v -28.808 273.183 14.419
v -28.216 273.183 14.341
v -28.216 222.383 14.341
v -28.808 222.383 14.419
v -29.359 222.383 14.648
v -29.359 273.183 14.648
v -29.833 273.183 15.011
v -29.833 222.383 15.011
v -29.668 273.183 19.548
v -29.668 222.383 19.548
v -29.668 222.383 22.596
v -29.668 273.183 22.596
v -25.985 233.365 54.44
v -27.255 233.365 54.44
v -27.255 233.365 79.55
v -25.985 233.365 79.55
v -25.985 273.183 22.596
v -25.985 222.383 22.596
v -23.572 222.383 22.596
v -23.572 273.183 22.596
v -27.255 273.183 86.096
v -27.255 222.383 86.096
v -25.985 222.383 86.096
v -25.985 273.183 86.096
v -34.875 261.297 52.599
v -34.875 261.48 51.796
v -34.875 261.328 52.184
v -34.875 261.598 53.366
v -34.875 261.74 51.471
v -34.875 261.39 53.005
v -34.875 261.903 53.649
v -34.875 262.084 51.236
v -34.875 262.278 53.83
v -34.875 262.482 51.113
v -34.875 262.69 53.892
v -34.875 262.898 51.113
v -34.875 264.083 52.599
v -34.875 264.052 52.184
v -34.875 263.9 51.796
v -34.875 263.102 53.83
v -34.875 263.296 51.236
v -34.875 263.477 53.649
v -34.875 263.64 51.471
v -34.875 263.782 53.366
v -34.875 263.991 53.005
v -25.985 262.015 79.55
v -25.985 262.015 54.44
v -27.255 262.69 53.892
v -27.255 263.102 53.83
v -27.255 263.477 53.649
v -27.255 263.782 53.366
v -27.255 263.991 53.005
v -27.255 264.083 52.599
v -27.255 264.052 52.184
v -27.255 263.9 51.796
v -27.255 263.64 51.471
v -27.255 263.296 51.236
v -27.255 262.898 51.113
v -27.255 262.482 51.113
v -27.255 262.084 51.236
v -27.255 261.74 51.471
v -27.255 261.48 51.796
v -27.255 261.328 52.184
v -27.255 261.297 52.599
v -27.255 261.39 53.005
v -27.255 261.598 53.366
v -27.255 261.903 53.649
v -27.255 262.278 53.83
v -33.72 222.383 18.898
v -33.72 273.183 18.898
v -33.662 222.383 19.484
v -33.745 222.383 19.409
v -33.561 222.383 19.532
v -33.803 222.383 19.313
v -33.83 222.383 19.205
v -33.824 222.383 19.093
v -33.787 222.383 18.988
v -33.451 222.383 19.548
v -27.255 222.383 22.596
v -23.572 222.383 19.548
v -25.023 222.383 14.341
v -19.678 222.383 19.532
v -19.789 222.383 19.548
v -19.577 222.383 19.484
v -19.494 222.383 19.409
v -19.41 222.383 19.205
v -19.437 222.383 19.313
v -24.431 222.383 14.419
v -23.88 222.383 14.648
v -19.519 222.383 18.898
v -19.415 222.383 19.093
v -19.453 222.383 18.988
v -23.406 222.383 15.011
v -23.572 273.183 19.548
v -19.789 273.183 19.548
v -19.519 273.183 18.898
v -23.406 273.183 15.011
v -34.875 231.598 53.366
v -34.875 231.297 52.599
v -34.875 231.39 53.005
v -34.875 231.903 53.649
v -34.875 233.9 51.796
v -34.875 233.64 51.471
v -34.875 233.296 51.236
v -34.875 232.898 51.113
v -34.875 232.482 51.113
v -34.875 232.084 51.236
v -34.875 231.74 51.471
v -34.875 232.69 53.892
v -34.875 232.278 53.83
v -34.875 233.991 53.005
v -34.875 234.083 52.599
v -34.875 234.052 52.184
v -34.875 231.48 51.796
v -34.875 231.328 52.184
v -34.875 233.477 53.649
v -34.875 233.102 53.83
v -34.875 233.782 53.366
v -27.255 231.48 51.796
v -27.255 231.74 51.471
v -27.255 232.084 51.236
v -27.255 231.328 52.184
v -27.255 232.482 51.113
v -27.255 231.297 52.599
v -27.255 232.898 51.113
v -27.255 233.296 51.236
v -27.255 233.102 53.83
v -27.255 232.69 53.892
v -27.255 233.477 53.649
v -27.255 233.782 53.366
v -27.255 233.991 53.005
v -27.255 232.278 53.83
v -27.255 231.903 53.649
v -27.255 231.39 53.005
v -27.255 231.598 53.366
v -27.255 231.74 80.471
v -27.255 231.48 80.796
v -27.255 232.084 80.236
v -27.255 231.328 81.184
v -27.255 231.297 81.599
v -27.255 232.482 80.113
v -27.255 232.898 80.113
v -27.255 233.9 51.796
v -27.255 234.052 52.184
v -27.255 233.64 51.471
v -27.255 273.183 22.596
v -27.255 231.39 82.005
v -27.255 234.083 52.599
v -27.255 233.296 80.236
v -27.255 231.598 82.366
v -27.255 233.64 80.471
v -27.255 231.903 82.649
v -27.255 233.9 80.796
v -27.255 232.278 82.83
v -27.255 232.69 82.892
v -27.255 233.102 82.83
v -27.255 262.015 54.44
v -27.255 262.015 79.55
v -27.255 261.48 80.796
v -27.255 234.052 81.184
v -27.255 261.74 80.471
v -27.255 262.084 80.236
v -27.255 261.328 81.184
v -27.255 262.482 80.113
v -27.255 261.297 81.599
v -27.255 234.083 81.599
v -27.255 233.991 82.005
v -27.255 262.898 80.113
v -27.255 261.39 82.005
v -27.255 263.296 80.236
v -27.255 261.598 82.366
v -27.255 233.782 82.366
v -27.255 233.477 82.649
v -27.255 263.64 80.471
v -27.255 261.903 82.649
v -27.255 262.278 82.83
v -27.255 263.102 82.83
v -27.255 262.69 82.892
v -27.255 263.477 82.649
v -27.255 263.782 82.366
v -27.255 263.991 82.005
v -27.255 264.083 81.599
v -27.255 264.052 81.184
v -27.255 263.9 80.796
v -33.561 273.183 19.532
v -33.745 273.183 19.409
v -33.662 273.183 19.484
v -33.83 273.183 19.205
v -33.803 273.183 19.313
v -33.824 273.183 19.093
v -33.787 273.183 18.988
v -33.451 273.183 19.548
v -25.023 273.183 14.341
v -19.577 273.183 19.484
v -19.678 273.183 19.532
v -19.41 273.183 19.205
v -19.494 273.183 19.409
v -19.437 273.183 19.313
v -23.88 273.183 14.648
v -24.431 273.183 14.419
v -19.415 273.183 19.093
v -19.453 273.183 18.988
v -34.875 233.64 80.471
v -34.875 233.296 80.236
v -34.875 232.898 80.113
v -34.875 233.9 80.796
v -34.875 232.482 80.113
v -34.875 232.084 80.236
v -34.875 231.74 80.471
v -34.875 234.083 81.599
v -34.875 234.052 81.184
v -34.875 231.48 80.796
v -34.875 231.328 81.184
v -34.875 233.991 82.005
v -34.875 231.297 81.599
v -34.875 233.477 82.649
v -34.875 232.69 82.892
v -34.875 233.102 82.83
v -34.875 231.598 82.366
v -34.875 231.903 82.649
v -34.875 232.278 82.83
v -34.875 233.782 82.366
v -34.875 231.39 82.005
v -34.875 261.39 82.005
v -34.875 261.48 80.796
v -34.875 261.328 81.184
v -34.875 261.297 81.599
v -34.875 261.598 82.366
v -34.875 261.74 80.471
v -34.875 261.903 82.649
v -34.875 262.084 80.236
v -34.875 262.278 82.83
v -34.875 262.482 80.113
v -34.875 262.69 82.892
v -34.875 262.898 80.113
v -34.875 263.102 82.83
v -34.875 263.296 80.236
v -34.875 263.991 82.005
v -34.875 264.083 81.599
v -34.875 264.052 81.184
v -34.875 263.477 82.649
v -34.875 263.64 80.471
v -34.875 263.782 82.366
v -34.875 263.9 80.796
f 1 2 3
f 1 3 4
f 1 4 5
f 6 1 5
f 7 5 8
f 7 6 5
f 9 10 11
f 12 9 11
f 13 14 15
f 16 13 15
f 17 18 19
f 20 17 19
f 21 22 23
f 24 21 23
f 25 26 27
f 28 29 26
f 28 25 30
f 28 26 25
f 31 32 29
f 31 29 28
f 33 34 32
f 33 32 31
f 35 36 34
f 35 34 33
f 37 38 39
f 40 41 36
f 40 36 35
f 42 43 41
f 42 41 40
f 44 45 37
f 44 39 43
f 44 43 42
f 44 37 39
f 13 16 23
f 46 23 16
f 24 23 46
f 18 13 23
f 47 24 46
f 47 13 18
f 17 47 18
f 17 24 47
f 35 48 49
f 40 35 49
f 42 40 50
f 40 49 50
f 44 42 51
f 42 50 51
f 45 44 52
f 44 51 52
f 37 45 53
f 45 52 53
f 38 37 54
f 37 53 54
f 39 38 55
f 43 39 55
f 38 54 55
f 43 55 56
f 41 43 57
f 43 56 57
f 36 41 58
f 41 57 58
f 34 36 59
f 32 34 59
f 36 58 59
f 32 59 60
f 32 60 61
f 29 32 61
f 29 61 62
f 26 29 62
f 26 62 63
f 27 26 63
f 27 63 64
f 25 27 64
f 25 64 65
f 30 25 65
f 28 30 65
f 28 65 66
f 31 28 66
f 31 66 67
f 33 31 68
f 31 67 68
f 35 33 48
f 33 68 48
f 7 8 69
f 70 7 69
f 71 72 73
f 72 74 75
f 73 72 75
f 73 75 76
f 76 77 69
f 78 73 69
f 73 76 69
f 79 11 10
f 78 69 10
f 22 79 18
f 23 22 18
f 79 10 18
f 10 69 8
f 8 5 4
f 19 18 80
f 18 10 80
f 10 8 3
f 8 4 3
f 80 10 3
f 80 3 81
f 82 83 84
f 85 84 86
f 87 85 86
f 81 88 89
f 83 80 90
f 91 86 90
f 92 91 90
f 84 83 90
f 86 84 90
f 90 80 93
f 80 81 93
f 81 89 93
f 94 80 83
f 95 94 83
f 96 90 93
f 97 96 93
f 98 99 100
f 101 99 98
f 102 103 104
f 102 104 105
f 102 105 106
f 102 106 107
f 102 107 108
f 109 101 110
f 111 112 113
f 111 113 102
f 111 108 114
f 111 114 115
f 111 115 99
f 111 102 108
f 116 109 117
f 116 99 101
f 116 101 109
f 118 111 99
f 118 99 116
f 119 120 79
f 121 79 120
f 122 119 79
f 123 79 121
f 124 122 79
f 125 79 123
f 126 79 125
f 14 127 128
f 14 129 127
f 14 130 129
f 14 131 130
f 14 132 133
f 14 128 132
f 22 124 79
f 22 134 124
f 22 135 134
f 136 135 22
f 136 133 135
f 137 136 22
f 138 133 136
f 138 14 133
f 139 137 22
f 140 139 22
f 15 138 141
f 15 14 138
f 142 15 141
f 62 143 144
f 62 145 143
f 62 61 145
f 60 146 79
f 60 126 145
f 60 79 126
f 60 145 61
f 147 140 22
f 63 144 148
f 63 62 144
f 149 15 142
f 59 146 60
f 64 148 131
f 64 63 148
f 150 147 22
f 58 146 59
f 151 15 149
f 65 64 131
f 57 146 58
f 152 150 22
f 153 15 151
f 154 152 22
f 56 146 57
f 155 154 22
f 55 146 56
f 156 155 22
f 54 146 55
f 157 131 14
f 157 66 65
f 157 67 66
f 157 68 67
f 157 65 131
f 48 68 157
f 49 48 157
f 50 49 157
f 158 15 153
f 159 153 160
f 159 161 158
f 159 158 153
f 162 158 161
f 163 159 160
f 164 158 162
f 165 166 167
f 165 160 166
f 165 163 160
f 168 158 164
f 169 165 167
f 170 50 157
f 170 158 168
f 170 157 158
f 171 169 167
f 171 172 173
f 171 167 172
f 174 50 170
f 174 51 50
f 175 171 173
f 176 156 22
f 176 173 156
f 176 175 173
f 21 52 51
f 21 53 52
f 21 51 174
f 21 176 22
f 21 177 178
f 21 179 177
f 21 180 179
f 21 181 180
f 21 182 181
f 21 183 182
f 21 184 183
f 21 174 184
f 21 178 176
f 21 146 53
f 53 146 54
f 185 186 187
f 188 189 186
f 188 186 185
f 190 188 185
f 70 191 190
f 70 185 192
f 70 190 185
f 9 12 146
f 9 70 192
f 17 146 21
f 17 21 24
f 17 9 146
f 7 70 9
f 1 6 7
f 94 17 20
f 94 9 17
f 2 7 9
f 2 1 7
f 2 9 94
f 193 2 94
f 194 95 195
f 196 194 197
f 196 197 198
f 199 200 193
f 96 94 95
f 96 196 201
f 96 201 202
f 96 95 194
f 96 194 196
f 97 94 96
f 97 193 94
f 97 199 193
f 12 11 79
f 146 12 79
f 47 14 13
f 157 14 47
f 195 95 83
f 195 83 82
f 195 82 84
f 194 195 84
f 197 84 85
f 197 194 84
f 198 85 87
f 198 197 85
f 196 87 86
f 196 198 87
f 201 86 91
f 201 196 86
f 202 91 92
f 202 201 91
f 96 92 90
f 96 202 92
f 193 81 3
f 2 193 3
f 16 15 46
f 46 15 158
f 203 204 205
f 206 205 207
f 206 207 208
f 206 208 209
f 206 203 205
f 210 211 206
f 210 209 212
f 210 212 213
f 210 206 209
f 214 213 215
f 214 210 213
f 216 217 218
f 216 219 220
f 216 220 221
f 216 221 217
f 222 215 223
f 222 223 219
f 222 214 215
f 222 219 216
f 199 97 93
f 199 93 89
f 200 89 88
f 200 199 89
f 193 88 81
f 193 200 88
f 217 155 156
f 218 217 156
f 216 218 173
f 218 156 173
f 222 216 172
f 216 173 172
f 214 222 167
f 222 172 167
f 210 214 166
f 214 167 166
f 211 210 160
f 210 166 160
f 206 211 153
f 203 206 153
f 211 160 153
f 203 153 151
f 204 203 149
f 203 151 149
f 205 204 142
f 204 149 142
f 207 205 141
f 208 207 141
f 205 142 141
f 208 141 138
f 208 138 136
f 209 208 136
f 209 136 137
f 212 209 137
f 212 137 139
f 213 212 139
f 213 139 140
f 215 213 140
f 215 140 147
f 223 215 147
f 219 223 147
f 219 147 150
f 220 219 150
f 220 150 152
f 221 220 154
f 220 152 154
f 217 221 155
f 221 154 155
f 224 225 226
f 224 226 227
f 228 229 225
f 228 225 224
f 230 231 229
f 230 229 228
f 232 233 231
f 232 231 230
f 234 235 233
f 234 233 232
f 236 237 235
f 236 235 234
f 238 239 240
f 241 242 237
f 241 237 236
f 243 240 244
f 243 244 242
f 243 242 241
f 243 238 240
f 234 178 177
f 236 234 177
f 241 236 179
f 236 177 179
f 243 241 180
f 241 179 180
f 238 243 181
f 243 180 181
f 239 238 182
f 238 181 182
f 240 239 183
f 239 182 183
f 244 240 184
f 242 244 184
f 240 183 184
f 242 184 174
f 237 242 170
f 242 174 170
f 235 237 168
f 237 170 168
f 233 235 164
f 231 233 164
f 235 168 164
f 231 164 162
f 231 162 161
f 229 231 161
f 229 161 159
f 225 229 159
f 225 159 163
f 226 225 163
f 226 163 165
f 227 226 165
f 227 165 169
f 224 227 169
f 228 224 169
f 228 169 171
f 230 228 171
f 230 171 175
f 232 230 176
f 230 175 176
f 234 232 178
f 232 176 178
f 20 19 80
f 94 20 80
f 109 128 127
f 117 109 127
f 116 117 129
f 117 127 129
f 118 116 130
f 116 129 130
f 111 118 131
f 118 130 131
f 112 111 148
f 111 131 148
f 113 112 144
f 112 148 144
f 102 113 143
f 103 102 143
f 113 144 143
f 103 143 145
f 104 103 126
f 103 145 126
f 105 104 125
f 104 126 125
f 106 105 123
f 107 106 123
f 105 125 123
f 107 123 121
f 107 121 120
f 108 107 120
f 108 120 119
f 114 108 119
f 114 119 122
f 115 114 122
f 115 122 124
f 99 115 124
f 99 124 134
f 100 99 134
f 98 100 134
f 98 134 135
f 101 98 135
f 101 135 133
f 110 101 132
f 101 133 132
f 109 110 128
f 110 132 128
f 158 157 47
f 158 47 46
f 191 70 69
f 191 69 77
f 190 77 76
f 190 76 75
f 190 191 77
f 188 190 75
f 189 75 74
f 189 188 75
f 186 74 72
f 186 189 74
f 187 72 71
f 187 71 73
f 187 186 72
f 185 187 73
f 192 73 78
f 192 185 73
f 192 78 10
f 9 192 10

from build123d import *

# Parameters (mm, degrees)
BOSS_EXTRUDE1_DEPTH = 50.8
SKETCH2_R           = 1.397
BOSS_EXTRUDE3_DEPTH = 7.62
SKETCH4_W           = 25.11
SKETCH4_H           = 28.65
CUT_EXTRUDE2_DEPTH  = 8.846923164


with BuildPart() as part:
    # Sketch1 → Boss-Extrude1 (new body)
    with BuildSketch(Plane(origin=(0, 273.183078415, 0), x_dir=(1, 0, 0), z_dir=(0, 1, 0))):
        with BuildLine():
            Line((-29.667642961, -22.342314993), (-29.667642961, -22.596314993))
            Line((-29.667642961, -22.596314993), (-27.254642961, -22.596314993))
            Line((-27.254642961, -22.596314993), (-27.254642961, -86.096314993))
            Line((-27.254642961, -86.096314993), (-25.984642961, -86.096314993))
            Line((-25.984642961, -86.096314993), (-25.984642961, -22.596314993))
            Line((-25.984642961, -22.596314993), (-23.571642961, -22.596314993))
            Line((-23.571642961, -22.596314993), (-23.571642961, -22.342314993))
            Line((-23.571642961, -22.342314993), (-23.571642961, -19.548314993))
            Line((-23.571642961, -19.548314993), (-19.788719797, -19.548314993))
            ThreePointArc((-19.788719797, -19.548314993), (-19.436721695, -19.313117381), (-19.519312114, -18.897907309))
            Line((-19.519312114, -18.897907309), (-23.406350532, -15.010868891))
            ThreePointArc((-23.406350532, -15.010868891), (-24.147982307, -14.515326382), (-25.022796633, -14.341314993))
            Line((-25.022796633, -14.341314993), (-28.216489288, -14.341314993))
            ThreePointArc((-28.216489288, -14.341314993), (-29.091303615, -14.515326382), (-29.83293539, -15.010868891))
            Line((-29.83293539, -15.010868891), (-33.719973808, -18.897907309))
            ThreePointArc((-33.719973808, -18.897907309), (-33.802564226, -19.313117381), (-33.450566125, -19.548314993))
            Line((-33.450566125, -19.548314993), (-29.667642961, -19.548314993))
            Line((-29.667642961, -19.548314993), (-29.667642961, -22.342314993))
        make_face()
    extrude(amount=-BOSS_EXTRUDE1_DEPTH)

    # Sketch2 → Boss-Extrude3 (add)
    with BuildSketch(Plane.ZY.offset(27.254642961)):
        with Locations((52.494743656, 232.690269259)):
            Circle(SKETCH2_R)
        with Locations((52.494743656, 262.690269259)):
            Circle(SKETCH2_R)
        with Locations((81.494743656, 262.690269259)):
            Circle(SKETCH2_R)
        with Locations((81.494743656, 232.690269259)):
            Circle(SKETCH2_R)
    extrude(amount=BOSS_EXTRUDE3_DEPTH)

    # Sketch4 → Cut-Extrude2 (cut, through all)
    with BuildSketch(Plane.ZY.offset(27.254642961)):
        with Locations((66.994743656, 247.690269259)):
            Rectangle(SKETCH4_W, SKETCH4_H)
    extrude(amount=-CUT_EXTRUDE2_DEPTH, mode=Mode.SUBTRACT)


solid = part.part
